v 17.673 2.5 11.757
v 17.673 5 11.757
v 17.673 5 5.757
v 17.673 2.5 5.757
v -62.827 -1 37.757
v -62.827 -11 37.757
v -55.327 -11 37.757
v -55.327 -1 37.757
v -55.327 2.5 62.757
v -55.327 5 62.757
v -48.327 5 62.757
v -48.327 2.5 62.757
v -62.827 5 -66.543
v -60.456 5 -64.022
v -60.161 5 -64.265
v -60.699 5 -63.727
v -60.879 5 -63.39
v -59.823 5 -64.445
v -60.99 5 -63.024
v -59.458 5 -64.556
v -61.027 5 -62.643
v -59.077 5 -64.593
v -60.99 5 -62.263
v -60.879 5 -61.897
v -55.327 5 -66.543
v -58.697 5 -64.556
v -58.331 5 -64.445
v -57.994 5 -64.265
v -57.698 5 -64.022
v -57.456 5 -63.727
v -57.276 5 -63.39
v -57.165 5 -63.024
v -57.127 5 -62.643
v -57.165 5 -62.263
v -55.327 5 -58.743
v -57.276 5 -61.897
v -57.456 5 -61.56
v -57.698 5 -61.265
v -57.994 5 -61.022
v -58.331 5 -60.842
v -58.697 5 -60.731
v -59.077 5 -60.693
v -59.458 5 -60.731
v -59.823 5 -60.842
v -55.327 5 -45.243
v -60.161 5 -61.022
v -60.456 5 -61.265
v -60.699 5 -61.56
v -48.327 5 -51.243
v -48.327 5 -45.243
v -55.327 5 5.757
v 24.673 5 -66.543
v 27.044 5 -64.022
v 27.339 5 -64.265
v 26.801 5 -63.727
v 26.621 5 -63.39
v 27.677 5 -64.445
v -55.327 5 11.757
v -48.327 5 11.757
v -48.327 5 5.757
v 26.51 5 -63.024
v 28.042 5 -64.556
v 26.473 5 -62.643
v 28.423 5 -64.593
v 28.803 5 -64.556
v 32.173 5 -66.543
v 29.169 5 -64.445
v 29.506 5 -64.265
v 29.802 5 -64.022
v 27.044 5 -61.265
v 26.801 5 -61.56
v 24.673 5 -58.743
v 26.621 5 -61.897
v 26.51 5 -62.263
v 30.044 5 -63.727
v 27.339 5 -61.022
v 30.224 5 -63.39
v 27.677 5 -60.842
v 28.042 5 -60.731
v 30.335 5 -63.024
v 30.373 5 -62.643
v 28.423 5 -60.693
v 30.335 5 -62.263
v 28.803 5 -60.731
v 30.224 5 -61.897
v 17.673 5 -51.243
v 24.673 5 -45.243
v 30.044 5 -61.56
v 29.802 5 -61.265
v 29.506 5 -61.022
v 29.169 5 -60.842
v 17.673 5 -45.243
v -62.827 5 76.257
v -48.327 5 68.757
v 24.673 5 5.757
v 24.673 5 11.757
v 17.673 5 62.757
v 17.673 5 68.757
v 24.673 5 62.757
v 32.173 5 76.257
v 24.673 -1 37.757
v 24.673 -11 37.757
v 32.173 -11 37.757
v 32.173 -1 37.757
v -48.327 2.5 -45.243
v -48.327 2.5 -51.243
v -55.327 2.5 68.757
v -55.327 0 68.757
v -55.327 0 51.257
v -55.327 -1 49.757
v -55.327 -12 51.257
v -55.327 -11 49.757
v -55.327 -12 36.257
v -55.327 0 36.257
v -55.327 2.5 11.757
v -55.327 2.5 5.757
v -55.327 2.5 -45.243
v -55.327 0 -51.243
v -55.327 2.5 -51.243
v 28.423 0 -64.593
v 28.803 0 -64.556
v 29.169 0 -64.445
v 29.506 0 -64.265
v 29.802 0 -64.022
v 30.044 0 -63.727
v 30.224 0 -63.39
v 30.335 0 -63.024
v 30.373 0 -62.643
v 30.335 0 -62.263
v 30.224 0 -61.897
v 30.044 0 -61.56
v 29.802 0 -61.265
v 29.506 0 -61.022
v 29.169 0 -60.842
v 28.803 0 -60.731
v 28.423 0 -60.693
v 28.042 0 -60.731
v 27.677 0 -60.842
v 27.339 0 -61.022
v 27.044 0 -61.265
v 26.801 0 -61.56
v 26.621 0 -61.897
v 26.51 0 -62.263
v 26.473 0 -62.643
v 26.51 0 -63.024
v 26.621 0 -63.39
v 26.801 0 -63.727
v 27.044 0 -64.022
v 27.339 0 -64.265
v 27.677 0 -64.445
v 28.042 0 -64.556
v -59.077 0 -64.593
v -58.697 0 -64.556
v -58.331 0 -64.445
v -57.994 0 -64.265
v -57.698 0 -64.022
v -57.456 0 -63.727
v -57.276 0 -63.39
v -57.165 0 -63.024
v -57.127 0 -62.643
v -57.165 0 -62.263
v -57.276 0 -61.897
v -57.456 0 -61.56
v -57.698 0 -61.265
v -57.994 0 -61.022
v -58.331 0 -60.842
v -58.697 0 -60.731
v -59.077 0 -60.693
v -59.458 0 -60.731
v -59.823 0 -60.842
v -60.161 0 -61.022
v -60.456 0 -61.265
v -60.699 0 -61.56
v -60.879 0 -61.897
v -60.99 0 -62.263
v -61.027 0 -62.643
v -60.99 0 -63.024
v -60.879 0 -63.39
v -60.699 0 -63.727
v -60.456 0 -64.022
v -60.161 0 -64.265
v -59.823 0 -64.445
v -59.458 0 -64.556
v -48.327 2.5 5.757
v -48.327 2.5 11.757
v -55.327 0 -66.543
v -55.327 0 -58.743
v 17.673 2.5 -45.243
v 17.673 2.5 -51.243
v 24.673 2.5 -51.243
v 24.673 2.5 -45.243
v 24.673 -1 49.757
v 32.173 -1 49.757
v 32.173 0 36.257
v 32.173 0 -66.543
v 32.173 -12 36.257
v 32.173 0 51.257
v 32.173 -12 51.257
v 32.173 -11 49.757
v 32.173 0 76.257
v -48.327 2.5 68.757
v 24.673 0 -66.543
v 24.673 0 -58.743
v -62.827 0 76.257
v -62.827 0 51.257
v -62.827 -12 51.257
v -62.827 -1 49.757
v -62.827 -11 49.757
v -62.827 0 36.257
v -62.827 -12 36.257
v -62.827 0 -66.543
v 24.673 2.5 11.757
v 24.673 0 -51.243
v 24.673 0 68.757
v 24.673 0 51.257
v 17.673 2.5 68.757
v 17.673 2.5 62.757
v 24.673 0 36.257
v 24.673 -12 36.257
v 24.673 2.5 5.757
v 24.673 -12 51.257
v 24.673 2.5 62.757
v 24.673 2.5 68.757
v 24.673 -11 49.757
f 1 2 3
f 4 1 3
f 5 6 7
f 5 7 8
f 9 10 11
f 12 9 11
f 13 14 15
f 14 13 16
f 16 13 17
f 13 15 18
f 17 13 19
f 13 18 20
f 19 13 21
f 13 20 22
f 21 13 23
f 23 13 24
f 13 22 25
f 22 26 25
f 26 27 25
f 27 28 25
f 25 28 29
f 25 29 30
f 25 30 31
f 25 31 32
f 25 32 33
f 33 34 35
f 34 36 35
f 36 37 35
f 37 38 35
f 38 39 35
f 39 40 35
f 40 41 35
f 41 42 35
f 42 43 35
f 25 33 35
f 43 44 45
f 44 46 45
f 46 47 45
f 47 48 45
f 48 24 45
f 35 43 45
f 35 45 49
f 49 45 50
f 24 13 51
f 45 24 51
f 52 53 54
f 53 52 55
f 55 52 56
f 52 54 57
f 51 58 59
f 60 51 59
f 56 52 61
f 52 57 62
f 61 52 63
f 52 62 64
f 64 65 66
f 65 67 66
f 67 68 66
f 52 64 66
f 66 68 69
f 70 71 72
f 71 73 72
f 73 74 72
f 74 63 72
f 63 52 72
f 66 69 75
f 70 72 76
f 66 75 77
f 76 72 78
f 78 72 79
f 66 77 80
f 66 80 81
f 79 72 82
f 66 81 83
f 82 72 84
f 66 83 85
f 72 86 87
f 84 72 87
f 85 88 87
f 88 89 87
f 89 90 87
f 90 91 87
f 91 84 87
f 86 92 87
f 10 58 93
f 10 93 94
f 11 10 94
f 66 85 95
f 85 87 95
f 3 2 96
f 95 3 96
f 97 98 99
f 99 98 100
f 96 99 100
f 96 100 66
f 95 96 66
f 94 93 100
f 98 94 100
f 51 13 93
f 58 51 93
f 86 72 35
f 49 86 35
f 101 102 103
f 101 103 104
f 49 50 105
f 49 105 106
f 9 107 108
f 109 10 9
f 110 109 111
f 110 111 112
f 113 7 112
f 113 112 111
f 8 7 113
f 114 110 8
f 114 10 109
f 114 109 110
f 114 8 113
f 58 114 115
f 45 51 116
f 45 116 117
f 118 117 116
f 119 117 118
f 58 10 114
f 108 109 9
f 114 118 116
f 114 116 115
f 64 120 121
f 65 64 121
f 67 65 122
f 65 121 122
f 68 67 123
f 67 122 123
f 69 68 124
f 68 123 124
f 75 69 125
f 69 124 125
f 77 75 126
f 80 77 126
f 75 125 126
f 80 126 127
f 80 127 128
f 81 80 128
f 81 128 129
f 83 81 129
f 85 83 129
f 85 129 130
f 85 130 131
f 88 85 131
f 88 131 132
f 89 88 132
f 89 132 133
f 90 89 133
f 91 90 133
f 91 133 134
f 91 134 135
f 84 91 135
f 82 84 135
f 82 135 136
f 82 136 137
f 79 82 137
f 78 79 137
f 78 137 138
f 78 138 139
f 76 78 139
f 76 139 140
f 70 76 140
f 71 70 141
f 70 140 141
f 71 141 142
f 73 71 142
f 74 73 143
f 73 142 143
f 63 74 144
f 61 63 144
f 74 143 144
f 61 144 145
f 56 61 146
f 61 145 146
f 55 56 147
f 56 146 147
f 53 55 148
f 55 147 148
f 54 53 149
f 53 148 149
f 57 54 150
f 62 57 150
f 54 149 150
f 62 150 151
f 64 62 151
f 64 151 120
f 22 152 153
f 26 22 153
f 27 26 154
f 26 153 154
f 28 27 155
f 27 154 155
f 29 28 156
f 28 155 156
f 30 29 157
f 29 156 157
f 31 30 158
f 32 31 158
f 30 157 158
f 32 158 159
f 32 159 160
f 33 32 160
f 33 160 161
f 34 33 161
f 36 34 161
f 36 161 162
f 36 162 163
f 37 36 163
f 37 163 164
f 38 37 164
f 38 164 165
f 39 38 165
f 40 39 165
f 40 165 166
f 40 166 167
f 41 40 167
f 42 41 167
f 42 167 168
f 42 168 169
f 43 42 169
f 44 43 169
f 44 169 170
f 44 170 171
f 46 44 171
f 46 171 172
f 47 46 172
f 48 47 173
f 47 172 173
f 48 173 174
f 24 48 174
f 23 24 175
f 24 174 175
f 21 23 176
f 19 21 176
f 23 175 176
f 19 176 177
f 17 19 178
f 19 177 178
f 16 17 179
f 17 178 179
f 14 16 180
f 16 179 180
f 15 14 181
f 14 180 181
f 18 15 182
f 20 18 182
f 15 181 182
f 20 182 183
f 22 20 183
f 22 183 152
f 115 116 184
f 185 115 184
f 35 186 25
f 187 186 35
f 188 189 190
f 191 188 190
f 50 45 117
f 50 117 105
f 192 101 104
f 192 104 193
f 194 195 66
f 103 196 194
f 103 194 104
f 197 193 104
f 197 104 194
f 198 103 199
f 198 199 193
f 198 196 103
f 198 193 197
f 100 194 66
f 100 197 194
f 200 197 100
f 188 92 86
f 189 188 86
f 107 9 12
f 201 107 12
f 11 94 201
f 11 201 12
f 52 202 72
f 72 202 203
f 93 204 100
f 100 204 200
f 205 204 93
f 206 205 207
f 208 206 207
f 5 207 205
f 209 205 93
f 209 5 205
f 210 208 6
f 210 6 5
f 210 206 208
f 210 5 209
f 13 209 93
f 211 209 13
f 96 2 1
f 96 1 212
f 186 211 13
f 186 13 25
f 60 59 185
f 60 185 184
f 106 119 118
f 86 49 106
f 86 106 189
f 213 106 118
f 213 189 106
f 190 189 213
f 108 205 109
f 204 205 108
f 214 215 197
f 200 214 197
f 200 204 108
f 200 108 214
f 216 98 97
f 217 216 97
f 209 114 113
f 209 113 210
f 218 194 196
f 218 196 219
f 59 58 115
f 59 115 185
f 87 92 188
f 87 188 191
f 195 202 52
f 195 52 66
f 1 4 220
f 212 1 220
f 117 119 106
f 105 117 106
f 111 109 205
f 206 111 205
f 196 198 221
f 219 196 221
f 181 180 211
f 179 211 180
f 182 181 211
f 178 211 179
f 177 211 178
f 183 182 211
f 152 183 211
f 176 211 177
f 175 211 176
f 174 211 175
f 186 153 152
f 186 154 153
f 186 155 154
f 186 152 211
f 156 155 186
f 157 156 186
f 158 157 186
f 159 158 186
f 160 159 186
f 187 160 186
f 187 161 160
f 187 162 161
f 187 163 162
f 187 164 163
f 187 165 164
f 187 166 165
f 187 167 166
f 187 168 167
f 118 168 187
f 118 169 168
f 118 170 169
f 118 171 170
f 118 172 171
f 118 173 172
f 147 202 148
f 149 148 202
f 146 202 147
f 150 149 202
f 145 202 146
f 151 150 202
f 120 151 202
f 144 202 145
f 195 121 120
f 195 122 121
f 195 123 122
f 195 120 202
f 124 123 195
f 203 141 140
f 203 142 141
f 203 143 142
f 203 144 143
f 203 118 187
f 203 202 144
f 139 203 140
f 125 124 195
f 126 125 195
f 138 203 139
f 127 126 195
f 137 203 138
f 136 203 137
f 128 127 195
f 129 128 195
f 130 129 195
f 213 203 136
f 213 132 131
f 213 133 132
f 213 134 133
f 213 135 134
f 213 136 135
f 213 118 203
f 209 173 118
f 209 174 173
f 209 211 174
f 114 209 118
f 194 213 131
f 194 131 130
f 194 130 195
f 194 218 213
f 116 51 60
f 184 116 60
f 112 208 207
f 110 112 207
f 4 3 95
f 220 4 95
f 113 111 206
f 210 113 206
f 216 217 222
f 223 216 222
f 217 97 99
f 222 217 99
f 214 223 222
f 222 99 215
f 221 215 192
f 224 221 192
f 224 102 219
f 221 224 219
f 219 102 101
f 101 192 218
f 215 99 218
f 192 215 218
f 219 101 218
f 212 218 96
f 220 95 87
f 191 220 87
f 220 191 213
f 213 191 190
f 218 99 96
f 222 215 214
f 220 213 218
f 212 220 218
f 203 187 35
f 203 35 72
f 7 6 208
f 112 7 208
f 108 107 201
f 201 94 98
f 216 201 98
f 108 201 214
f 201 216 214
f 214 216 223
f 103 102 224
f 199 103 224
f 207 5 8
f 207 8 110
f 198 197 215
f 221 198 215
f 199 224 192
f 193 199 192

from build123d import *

# Parameters (mm, degrees)
SKETCH1_W           = 95
SKETCH1_H           = 135
BOSS_EXTRUDE1_DEPTH = 5
SKETCH3_W           = 80
SKETCH3_H           = 120
CUT_EXTRUDE1_DEPTH  = 99.930888994
SKETCH4_W           = 7
SKETCH4_H           = 6
BOSS_EXTRUDE4_DEPTH = 2.5
SKETCH6_W           = 7.5
SKETCH6_H           = 7.8
BOSS_EXTRUDE5_DEPTH = 5
SKETCH7_R           = 1.95
CUT_EXTRUDE2_DEPTH  = 10
SKETCH16_W          = 7.5
SKETCH16_H          = 15
BOSS_EXTRUDE9_DEPTH = 12
SKETCH18_W          = 12
SKETCH18_H          = 10
CUT_EXTRUDE3_DEPTH  = 1002


with BuildPart() as part:
    # Sketch1 → Boss-Extrude1 (new body)
    with BuildSketch(Plane(origin=(0, 0, 0), x_dir=(1, 0, 0), z_dir=(0, 1, 0))):
        with Locations((-15.327225131, -8.756544503)):
            Rectangle(SKETCH1_W, SKETCH1_H)
    extrude(amount=BOSS_EXTRUDE1_DEPTH)

    # Sketch3 → Cut-Extrude1 (cut, through all)
    with BuildSketch(Plane(origin=(0, 5, 0), x_dir=(1, 0, 0), z_dir=(0, 1, 0))):
        with Locations((-15.327225131, -8.756544503)):
            Rectangle(SKETCH3_W, SKETCH3_H)
    extrude(amount=-CUT_EXTRUDE1_DEPTH, mode=Mode.SUBTRACT)

    # Sketch4 → Boss-Extrude4 (add)
    with BuildSketch(Plane(origin=(0, 5, 0), x_dir=(1, 0, 0), z_dir=(0, 1, 0))):
        with Locations((-51.827225131, 48.243455497)):
            Rectangle(SKETCH4_W, SKETCH4_H)
        with Locations((21.172774869, -65.756544503)):
            Rectangle(SKETCH4_W, SKETCH4_H)
        with Locations((21.172774869, 48.243455497)):
            Rectangle(SKETCH4_W, SKETCH4_H)
        with Locations((-51.827225131, -65.756544503)):
            Rectangle(SKETCH4_W, SKETCH4_H)
        with Locations((-51.827225131, -8.756544503)):
            Rectangle(SKETCH4_W, SKETCH4_H)
        with Locations((21.172774869, -8.756544503)):
            Rectangle(SKETCH4_W, SKETCH4_H)
    extrude(amount=-BOSS_EXTRUDE4_DEPTH)

    # Sketch6 → Boss-Extrude5 (add)
    with BuildSketch(Plane.XZ):
        with Locations((28.422774869, -62.643455497)):
            Rectangle(SKETCH6_W, SKETCH6_H)
        with Locations((-59.077225131, -62.643455497)):
            Rectangle(SKETCH6_W, SKETCH6_H)
    extrude(amount=-BOSS_EXTRUDE5_DEPTH)

    # Sketch7 → Cut-Extrude2 (cut)
    with BuildSketch(Plane(origin=(0, 0, 0), x_dir=(-1, 0, 0), z_dir=(0, -1, 0))):
        with Locations(Location((59.077225131, 62.643455497, 0), (0, 0, 90))):
            Circle(SKETCH7_R)
        with Locations(Location((-28.422774869, 62.643455497, 0), (0, 0, 90))):
            Circle(SKETCH7_R)
    extrude(amount=-CUT_EXTRUDE2_DEPTH, mode=Mode.SUBTRACT)

    # Sketch16 → Boss-Extrude9 (add)
    with BuildSketch(Plane(origin=(0, 0, 0), x_dir=(-1, 0, 0), z_dir=(0, -1, 0))):
        with Locations((59.077225131, -43.756544503)):
            Rectangle(SKETCH16_W, SKETCH16_H)
        with Locations((-28.422774869, -43.756544503)):
            Rectangle(SKETCH16_W, SKETCH16_H)
    extrude(amount=BOSS_EXTRUDE9_DEPTH)

    # Sketch18 → Cut-Extrude3 (cut)
    with BuildSketch(Plane.ZY.offset(62.827225131)):
        with Locations((43.756544503, -6)):
            Rectangle(SKETCH18_W, SKETCH18_H)
    extrude(amount=-CUT_EXTRUDE3_DEPTH, mode=Mode.SUBTRACT)


solid = part.part
